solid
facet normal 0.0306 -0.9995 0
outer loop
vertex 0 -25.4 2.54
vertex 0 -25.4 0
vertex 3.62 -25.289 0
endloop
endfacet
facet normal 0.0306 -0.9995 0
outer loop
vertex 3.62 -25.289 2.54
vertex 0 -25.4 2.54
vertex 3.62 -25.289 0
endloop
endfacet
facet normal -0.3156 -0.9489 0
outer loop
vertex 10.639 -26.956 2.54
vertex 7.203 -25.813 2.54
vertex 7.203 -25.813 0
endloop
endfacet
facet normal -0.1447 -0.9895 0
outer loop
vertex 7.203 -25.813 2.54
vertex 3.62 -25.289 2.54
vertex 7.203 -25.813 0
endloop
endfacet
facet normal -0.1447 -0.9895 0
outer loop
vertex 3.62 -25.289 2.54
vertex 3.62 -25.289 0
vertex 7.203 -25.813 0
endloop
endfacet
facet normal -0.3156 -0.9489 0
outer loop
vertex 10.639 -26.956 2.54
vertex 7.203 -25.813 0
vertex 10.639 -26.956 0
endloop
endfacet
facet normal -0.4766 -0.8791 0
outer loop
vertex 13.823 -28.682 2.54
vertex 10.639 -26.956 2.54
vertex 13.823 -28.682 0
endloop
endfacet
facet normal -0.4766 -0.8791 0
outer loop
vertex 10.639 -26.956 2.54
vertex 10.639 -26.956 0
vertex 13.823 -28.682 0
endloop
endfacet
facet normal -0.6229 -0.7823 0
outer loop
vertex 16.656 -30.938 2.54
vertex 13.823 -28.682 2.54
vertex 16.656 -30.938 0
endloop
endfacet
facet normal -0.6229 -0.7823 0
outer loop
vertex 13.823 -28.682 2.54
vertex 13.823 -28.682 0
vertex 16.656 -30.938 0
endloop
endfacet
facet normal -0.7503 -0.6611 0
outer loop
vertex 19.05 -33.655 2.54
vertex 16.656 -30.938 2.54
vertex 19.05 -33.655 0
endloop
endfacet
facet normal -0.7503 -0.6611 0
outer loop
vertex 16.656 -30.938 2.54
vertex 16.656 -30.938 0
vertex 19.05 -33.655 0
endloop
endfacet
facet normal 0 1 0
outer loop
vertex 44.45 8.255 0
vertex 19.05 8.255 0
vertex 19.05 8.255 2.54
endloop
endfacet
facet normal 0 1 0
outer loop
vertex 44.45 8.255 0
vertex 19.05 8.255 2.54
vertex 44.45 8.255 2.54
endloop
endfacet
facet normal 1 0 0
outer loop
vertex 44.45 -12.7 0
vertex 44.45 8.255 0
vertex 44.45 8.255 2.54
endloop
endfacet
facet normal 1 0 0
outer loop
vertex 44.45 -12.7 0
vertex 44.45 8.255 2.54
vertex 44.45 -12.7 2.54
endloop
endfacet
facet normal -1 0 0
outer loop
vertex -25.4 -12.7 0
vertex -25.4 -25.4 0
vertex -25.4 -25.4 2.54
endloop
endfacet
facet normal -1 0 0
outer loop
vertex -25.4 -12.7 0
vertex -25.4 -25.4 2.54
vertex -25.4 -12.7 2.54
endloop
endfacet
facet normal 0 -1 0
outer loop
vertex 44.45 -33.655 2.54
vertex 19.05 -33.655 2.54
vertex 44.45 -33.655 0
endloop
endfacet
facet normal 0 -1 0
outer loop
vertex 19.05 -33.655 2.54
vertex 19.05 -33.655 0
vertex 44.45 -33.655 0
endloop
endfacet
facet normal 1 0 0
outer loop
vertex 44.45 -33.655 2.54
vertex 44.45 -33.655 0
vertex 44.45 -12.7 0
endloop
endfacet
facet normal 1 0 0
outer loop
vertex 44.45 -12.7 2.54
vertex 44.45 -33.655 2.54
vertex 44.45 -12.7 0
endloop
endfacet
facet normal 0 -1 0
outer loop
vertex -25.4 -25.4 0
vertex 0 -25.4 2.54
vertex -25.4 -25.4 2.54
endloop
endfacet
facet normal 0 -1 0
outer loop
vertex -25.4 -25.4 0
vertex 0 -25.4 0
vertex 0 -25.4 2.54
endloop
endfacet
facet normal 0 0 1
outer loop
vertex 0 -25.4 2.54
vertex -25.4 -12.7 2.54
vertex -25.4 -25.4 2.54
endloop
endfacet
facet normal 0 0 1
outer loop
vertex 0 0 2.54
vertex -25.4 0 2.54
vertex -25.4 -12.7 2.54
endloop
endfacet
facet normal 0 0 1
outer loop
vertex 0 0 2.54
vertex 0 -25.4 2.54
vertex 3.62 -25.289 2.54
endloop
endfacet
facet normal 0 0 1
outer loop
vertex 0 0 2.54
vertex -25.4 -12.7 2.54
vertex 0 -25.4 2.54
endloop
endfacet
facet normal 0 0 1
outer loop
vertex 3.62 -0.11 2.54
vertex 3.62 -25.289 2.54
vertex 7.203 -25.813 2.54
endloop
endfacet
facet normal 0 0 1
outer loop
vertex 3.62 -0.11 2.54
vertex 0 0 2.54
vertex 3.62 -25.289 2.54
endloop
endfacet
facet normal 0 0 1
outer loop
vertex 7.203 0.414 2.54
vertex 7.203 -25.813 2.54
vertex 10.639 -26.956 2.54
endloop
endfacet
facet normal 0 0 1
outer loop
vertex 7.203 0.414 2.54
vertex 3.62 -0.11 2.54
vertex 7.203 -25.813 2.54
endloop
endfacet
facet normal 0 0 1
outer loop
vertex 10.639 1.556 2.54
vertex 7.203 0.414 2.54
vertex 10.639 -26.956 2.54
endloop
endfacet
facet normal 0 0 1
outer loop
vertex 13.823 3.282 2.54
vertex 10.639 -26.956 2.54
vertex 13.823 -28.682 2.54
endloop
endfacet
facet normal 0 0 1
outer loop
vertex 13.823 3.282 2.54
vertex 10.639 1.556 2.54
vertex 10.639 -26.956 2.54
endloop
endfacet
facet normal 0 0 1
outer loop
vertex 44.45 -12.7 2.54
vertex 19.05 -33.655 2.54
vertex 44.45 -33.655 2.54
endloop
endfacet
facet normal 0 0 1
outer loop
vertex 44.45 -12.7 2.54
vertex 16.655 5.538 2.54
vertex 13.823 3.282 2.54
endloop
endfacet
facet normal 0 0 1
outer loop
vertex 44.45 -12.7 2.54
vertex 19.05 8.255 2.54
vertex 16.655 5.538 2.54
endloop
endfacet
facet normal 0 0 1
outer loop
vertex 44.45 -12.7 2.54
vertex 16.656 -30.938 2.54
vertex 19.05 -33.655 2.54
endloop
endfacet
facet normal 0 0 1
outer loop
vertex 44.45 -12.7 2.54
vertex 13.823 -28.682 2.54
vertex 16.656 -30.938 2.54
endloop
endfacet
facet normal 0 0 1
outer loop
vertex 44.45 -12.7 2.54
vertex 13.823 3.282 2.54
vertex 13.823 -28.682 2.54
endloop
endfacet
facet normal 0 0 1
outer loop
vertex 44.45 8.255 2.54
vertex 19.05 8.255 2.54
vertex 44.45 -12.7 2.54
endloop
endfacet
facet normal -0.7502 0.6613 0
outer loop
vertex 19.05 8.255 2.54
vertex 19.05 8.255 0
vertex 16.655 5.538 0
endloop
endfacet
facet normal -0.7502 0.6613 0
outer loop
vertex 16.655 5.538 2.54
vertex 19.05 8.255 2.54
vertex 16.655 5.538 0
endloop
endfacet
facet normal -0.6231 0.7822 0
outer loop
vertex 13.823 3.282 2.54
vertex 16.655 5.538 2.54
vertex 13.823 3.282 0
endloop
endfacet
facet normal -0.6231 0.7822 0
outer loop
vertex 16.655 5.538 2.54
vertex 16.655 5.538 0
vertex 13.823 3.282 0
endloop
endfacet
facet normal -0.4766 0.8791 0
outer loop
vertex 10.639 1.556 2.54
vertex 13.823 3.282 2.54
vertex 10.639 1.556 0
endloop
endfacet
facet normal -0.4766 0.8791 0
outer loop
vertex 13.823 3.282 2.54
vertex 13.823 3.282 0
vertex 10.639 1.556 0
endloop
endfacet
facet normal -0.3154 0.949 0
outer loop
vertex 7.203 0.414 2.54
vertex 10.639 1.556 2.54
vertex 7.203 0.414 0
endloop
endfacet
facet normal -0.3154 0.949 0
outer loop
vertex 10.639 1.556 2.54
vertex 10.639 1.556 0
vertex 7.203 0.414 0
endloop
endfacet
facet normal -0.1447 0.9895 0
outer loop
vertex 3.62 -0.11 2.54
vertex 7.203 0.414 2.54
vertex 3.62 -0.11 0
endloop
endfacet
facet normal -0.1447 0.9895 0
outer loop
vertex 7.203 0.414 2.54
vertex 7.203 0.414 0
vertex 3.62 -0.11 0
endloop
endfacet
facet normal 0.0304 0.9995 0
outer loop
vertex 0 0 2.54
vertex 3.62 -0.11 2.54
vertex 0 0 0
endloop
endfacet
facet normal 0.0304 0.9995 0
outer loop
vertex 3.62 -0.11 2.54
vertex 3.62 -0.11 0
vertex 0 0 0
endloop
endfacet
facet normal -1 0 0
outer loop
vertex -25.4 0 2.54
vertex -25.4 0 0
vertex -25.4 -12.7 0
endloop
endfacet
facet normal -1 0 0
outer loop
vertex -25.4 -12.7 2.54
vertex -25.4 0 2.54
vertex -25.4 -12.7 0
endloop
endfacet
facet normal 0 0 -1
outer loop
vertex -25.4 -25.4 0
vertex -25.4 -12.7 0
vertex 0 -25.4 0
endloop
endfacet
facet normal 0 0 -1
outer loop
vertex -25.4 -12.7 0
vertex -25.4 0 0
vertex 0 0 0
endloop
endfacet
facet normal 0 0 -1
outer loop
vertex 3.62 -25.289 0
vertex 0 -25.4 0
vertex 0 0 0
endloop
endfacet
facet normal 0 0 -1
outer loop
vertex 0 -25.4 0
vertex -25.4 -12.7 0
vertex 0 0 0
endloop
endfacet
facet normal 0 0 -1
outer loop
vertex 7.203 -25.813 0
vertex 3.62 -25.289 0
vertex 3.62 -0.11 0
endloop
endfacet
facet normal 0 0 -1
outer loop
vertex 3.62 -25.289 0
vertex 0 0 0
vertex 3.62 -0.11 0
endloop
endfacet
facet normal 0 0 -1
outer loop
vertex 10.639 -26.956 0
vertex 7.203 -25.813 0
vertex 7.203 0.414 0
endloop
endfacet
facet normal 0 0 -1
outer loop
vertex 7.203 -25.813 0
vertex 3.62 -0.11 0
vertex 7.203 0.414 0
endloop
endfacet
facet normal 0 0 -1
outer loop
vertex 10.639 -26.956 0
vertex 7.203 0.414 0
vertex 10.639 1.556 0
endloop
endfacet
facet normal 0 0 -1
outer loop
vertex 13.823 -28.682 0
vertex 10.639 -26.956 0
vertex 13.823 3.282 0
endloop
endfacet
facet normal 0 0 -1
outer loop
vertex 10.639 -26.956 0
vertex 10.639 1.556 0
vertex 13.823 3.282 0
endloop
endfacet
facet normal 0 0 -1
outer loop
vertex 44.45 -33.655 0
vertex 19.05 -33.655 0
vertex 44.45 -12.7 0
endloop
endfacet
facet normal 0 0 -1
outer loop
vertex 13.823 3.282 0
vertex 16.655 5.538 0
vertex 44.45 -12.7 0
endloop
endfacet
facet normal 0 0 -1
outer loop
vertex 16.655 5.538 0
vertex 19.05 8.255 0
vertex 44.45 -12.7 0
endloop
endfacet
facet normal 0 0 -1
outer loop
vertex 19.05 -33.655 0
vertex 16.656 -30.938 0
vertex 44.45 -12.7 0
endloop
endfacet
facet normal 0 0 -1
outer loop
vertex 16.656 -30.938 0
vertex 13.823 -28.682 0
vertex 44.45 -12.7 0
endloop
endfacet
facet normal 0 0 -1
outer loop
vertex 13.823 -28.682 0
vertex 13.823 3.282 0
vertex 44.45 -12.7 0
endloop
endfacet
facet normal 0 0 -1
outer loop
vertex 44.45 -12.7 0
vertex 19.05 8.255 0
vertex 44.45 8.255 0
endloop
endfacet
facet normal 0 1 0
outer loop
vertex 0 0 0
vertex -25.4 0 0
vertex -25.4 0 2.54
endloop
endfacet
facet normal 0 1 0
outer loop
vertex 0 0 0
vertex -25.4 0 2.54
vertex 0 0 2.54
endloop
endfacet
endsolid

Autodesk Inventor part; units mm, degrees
ref_plane "YZ Plane" through (0, 0, 0) normal (1, 0, 0) x (0, 1, 0)
ref_plane "XZ Plane" through (0, 0, 0) normal (0, 1, 0) x (-1, 0, 0)
ref_plane "XY Plane" through (0, 0, 0) normal (0, 0, 1) x (1, 0, 0)
sketch "Sketch1" plane through (0, 0, 0) normal (0, 0, 1) x (1, 0, 0)
  line L0 (-25.4, 0) -> (-25.4, -12.7)
  line L1 (19.05, 8.255) -> (44.45, 8.255)
  line L2 (44.45, 8.255) -> (44.45, -12.7)
  line L3 (0, -25.4) -> (-25.4, -25.4)
  line L4 (-25.4, -25.4) -> (-25.4, -12.7)
  line L5 (19.05, -33.655) -> (44.45, -33.655)
  line L6 (44.45, -33.655) -> (44.45, -12.7)
  line L7 (-25.4, 0) -> (0, 0)
  arc A0 (0, 0) -> (19.05, 8.255) centre (2.4365, 20.4857) ccw
  arc A1 (19.05, -33.655) -> (0, -25.4) centre (2.4389, -45.8801) ccw
  dimension "d2" = 12.7
  dimension "d3" = 25.4
  dimension "d4" = 20.955
  dimension "d5" = 20.955
  dimension "d6" = 20.6248
extrude "Extrusion1" add sketch "Sketch1" along normal blind 2.54
sketch "Sketch2" plane through (0, 0, 2.54) normal (0, 0, 1) x (1, 0, 0)
  line L0 (0, 0) -> (-25.4, 0) projected
  line L1 (-25.4, 0) -> (-25.4, -25.4) projected
  line L2 (-25.4, -25.4) -> (0, -25.4) projected
  arc A0 (19.05, -33.655) -> (0, -25.4) centre (2.4389, -45.8801) ccw projected
  line L3 (19.05, -33.655) -> (44.45, -33.655) projected
  line L4 (44.45, -33.655) -> (44.45, 8.255) projected
  line L5 (44.45, 8.255) -> (19.05, 8.255) projected
  arc A1 (0, 0) -> (19.05, 8.255) centre (2.4365, 20.4857) ccw projected
properties part number "Sweep"
